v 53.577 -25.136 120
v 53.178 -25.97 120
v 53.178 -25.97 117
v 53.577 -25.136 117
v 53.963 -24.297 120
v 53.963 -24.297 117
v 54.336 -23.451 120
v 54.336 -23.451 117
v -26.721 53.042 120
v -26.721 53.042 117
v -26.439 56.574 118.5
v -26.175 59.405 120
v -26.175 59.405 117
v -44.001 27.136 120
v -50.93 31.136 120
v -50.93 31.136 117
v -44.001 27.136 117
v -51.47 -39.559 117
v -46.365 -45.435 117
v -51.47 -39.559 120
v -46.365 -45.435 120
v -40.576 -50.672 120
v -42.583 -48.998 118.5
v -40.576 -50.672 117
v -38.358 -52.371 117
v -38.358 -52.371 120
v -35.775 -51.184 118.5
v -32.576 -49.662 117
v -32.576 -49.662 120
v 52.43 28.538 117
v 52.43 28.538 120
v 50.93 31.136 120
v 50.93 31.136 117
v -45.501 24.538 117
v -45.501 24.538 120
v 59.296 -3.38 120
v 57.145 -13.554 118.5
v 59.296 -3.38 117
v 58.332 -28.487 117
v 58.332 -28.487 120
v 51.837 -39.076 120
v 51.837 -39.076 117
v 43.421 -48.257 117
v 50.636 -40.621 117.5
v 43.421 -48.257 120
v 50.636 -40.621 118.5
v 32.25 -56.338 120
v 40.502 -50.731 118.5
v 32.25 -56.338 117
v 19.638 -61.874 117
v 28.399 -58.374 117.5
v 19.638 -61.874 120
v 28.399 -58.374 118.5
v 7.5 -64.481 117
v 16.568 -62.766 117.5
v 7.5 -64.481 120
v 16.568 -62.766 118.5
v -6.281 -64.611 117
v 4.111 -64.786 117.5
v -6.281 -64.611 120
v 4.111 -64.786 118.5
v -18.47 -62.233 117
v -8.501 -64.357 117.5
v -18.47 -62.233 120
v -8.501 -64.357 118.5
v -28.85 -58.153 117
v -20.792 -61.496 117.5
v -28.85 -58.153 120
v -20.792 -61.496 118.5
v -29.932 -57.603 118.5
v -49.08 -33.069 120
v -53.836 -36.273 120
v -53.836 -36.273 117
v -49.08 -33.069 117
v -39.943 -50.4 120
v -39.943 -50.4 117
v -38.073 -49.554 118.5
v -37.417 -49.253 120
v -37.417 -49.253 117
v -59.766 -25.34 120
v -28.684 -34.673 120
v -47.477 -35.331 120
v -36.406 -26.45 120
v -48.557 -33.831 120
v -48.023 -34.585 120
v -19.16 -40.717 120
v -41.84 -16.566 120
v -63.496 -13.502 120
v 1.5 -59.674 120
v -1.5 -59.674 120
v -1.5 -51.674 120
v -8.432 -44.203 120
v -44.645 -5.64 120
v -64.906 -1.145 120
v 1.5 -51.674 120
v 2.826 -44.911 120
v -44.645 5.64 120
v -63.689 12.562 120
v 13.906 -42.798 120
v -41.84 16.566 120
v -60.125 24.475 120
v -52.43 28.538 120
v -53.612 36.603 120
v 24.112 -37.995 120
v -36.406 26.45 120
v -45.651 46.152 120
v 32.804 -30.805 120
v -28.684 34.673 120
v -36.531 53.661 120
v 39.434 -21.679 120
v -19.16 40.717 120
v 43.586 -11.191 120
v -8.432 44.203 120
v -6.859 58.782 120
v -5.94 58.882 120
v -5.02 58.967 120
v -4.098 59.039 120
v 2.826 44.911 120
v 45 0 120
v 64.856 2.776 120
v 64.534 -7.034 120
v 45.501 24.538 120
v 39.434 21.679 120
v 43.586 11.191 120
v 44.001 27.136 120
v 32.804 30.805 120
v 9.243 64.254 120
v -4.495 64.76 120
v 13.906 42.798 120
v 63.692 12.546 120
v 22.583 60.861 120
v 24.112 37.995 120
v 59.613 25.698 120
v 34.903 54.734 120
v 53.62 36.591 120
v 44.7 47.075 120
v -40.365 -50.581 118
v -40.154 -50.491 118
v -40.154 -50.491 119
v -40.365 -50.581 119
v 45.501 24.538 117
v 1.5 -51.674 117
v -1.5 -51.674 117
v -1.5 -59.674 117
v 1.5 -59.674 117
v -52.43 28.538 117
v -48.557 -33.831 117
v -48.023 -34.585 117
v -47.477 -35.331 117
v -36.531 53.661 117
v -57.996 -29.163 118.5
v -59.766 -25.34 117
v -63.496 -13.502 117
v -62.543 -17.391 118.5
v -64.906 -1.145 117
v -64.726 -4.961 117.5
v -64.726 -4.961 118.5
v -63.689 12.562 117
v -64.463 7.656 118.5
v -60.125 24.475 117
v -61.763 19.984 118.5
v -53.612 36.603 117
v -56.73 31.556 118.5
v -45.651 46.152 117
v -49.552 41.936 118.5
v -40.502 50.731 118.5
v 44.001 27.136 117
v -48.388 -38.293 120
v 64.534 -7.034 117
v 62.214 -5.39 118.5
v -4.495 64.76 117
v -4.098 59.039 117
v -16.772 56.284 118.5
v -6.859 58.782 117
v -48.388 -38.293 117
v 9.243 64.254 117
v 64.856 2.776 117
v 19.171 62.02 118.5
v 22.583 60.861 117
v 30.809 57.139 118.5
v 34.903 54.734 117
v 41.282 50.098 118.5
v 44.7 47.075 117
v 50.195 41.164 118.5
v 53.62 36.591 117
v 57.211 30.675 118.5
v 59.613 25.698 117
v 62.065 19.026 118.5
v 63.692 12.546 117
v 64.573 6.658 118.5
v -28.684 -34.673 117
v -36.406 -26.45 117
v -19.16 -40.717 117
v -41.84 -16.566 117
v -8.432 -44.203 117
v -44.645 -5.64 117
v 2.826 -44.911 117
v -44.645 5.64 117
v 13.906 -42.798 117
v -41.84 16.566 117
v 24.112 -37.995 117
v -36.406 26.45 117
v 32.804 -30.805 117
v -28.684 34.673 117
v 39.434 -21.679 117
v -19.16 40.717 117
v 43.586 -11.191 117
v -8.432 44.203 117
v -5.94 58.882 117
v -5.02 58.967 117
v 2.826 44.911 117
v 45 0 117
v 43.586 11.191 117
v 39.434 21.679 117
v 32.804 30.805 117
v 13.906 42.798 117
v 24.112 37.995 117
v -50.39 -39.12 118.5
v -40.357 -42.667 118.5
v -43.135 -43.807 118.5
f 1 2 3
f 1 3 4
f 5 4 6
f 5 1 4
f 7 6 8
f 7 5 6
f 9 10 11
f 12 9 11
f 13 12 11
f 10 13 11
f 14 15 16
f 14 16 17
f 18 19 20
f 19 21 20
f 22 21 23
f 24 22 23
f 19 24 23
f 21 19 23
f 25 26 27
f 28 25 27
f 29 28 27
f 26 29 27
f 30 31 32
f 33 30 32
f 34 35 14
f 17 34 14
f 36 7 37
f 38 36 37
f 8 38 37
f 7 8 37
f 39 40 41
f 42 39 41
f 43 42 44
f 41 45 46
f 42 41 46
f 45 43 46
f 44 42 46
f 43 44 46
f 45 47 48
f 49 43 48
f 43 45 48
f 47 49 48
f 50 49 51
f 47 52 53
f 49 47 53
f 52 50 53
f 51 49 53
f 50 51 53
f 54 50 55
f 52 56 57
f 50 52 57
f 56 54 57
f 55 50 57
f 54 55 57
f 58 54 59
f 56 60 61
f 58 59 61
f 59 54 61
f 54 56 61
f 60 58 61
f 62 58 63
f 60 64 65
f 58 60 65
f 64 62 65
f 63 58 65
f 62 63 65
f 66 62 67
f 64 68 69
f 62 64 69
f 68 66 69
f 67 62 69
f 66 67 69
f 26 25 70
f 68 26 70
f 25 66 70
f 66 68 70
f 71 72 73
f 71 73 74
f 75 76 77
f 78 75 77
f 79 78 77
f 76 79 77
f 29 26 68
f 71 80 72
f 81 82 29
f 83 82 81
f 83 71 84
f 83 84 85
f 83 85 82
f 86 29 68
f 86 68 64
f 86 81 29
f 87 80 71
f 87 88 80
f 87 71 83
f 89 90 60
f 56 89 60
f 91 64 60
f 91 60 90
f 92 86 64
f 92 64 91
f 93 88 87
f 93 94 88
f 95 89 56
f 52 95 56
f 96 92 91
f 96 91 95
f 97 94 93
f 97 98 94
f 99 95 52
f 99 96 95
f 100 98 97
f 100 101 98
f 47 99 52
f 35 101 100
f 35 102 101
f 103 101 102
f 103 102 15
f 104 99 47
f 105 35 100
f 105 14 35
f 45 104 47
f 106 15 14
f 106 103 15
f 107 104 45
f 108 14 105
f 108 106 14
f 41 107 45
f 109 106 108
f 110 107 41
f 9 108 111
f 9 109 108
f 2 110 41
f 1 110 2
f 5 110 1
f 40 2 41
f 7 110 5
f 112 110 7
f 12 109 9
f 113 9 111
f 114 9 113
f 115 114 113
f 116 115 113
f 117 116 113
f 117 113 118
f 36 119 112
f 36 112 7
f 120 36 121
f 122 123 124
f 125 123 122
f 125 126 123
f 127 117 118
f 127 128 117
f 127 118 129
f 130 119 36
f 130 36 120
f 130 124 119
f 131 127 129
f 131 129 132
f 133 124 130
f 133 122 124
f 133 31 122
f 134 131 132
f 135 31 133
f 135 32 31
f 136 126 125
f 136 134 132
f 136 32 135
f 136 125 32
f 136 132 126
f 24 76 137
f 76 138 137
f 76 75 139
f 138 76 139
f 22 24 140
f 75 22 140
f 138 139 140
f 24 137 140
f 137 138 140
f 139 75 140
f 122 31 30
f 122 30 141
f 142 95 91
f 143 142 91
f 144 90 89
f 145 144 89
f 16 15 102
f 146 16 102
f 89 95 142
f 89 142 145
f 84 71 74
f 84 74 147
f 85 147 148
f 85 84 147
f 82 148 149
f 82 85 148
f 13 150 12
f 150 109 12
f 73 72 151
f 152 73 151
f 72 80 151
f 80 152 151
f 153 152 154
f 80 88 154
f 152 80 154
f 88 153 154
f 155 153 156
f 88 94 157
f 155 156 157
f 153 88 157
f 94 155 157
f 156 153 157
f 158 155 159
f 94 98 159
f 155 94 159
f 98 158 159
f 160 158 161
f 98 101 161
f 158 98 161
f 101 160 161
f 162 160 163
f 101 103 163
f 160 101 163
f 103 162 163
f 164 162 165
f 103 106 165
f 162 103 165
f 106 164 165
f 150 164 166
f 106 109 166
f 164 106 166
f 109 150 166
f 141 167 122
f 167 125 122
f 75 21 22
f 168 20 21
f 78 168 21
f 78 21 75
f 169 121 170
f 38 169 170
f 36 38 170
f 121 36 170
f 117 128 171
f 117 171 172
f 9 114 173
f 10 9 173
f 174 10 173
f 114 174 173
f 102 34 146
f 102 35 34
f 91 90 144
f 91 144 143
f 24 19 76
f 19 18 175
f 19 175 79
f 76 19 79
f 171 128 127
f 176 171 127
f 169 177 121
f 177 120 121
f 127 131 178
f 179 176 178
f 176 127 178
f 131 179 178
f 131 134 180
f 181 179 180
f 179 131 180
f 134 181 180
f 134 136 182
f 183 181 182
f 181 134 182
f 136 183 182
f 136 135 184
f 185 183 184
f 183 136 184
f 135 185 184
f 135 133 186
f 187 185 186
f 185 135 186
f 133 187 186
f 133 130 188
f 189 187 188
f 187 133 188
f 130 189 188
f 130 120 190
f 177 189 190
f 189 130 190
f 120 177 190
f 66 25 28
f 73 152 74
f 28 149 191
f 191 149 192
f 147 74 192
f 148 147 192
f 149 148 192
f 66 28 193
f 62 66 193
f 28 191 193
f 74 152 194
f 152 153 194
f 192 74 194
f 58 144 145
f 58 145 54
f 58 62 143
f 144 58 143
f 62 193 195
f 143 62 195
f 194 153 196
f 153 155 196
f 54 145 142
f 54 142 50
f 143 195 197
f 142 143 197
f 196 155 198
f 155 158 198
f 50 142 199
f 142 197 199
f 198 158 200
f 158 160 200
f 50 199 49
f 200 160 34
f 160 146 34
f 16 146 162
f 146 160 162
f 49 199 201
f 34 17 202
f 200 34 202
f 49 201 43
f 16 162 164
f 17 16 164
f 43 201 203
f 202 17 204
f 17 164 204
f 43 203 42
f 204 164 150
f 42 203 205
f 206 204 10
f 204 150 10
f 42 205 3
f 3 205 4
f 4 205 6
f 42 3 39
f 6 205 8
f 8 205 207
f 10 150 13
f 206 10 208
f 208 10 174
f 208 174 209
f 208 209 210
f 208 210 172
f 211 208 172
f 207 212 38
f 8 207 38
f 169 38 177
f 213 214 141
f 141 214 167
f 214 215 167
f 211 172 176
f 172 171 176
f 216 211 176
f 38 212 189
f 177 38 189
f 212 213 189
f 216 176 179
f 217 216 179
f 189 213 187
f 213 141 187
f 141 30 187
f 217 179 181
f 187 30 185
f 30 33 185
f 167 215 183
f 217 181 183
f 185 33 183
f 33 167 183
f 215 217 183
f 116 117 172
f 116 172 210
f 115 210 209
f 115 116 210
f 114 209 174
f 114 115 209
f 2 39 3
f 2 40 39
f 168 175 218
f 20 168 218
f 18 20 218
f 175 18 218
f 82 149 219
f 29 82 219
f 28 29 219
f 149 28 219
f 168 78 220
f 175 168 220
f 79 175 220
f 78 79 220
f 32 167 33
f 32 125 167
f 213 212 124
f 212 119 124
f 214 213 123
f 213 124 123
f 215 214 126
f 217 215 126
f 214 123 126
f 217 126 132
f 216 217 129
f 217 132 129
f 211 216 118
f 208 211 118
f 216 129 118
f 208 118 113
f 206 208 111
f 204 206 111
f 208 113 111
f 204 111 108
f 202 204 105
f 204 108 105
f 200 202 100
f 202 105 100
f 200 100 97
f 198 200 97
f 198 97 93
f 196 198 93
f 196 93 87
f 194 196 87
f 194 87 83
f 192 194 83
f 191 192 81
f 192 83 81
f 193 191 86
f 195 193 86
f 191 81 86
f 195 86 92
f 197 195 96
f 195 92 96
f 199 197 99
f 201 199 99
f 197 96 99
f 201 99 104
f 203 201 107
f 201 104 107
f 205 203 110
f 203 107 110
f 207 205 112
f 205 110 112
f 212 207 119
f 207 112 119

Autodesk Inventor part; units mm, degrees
ref_plane "YZ Plane" through (0, 0, 0) normal (1, 0, 0) x (0, 1, 0)
ref_plane "XZ Plane" through (0, 0, 0) normal (0, 1, 0) x (-1, 0, 0)
ref_plane "XY Plane" through (0, 0, 0) normal (0, 0, 1) x (1, 0, 0)
ref_plane "Work Plane1" through (0, 193.1274, 120) normal (0, 0, 1) x (1, 0, 0)
sketch "Sketch1" plane through (0, 193.1274, 120) normal (0, 0, 1) x (1, 0, 0)
  spline S0 degree 3 poles (-8.5236, -128.7736) (-8.5781, -129.1585) (-8.6317, -129.5435) (-8.7822, -130.6438) (-8.877, -131.3595) (-8.9685, -132.0756) knots 0 0 0 0 0.34999 0.34999 1 1 1 1
  spline S1 degree 3 poles (-8.9685, -132.0756) (-11.4491, -132.616) (-13.9179, -133.213) (-18.9128, -134.5473) (-21.4399, -135.2896) (-23.9457, -136.0968) knots 0.135755 0.135755 0.135755 0.135755 0.897312 0.897312 1.686862 1.686862 1.686862 1.686862
  spline S2 degree 3 poles (-23.9457, -136.0968) (-23.9236, -135.8572) (-23.9012, -135.6176) (-23.8137, -134.697) (-23.7461, -134.0162) (-23.6756, -133.3357) knots 0 0 0 0 0.260219 0.260219 1 1 1 1
  spline S3 degree 3 poles (-23.6756, -133.3357) (-23.6491, -133.1076) (-23.6222, -132.8795) (-23.595, -132.6515) knots 0 0 0 0 1 1 1 1
  spline S4 degree 3 poles (-23.595, -132.6515) (-18.7496, -130.761) (-13.6896, -129.4578) (-8.5236, -128.7736) knots 20.983609 20.983609 20.983609 20.983609 22.549805 22.549805 22.549805 22.549805
  spline S5 degree 3 poles (59.9939, -217.9227) (59.6983, -217.6913) (59.4023, -217.4606) (58.5248, -216.78) (57.9417, -216.3318) (57.3567, -215.8863) knots 0 0 0 0 0.337929 0.337929 1 1 1 1
  spline S6 degree 3 poles (57.3567, -215.8863) (58.129, -213.4679) (58.8464, -211.0314) (60.1883, -206.0385) (60.809, -203.4788) (61.3628, -200.9052) knots 0.135755 0.135755 0.135755 0.135755 0.897312 0.897312 1.686862 1.686862 1.686862 1.686862
  spline S7 degree 3 poles (61.3628, -200.9052) (61.5593, -201.0441) (61.7556, -201.1833) (62.5091, -201.7193) (63.0649, -202.1183) (63.6189, -202.5196) knots 0 0 0 0 0.260219 0.260219 1 1 1 1
  spline S8 degree 3 poles (63.6189, -202.5196) (63.8032, -202.6566) (63.9873, -202.794) (64.1712, -202.9316) knots 0 0 0 0 1 1 1 1
  spline S9 degree 3 poles (64.1712, -202.9316) (63.7306, -205.8156) (63.0951, -208.6728) (61.6213, -213.6722) (60.8623, -215.8215) (59.9939, -217.9227) knots 34.623618 34.623618 34.623618 34.623618 35.502619 35.502619 36.187238 36.187238 36.187238 36.187238
  spline S10 degree 3 poles (-32.5756, -242.7893) (-35.2521, -240.5525) (-37.8465, -238.2164) (-42.8091, -233.429) (-45.1835, -230.9795) (-47.4773, -228.4585) knots 0.183672 0.183672 0.183672 0.183672 1.230026 1.230026 2.252069 2.252069 2.252069 2.252069
  spline S11 degree 3 poles (-47.4773, -228.4585) (-48.486, -228.8718) (-49.4978, -229.2781) (-51.3339, -230.0008) (-52.1579, -230.3199) (-52.9837, -230.6347) knots 0.191156 0.191156 0.191156 0.191156 0.518074 0.518074 0.783091 0.783091 0.783091 0.783091
  spline S12 degree 3 poles (-52.9837, -230.6347) (-54.8569, -227.9885) (-56.5335, -225.1998) (-61.7939, -214.7383) (-64.08, -206.5168) (-65.372, -189.6602) (-64.3656, -181.1864) (-59.1613, -165.1013) (-55.0131, -157.644) (-44.0918, -144.739) (-37.423, -139.4149) (-28.6906, -134.8793) (-27.4411, -134.2804) (-26.1751, -133.7226) knots 9.166621 9.166621 9.166621 9.166621 10.143606 10.143606 12.679507 12.679507 15.215408 15.215408 17.75131 17.75131 20.287211 20.287211 20.703322 20.703322 20.703322 20.703322
  spline S13 degree 3 poles (-26.1751, -133.7226) (-26.2685, -134.6656) (-26.3566, -135.6092) (-26.5417, -137.7293) (-26.6358, -138.907) (-26.7206, -140.0852) knots 0.27267 0.27267 0.27267 0.27267 0.556851 0.556851 0.91105 0.91105 0.91105 0.91105
  spline S14 degree 3 poles (-26.7206, -140.0852) (-23.4453, -138.8857) (-20.1249, -137.8069) (-13.4977, -135.9029) (-10.1891, -135.0714) (-6.8589, -134.3454) knots 0.183672 0.183672 0.183672 0.183672 1.230026 1.230026 2.252069 2.252069 2.252069 2.252069
  spline S15 degree 3 poles (-6.8589, -134.3454) (-6.7126, -133.2651) (-6.5585, -132.1857) (-6.2663, -130.2343) (-6.1307, -129.3611) (-5.9904, -128.4886) knots 0.191156 0.191156 0.191156 0.191156 0.518074 0.518074 0.783091 0.783091 0.783091 0.783091
  spline S16 degree 3 poles (-5.9904, -128.4886) (-5.9303, -128.483) (-5.8702, -128.4775) (2.609, -127.7156) (11.0954, -128.6107) (27.2473, -133.6035) (34.7585, -137.6534) (47.8056, -148.4045) (53.2169, -155.0028) (61.2055, -169.9023) (63.7065, -178.061) (65.044, -191.0327) (65.0284, -195.6223) (64.5336, -200.1615) knots 22.804998 22.804998 22.804998 22.804998 22.823113 22.823113 25.359014 25.359014 27.894915 27.894915 30.430817 30.430817 32.966718 32.966718 34.342971 34.342971 34.342971 34.342971
  spline S17 degree 3 poles (64.5336, -200.1615) (63.7637, -199.6091) (62.9906, -199.0611) (61.247, -197.8407) (60.2742, -197.1704) (59.2962, -196.5078) knots 0.27267 0.27267 0.27267 0.27267 0.556851 0.556851 0.91105 0.91105 0.91105 0.91105
  spline S18 degree 3 poles (59.2962, -196.5078) (58.7011, -199.9229) (57.9804, -203.3168) (56.3185, -210.0089) (55.3791, -213.311) (54.3362, -216.5785) knots 0.183672 0.183672 0.183672 0.183672 1.223566 1.223566 2.252068 2.252068 2.252068 2.252068
  spline S19 degree 3 poles (54.3362, -216.5785) (55.1888, -217.2378) (56.0367, -217.9032) (57.5809, -219.1316) (58.279, -219.6934) (58.9741, -220.259) knots 0.191156 0.191156 0.191156 0.191156 0.514352 0.514352 0.783093 0.783093 0.783093 0.783093
  spline S20 degree 3 poles (-48.3881, -231.4203) (-46.6799, -233.2984) (-44.9285, -235.1379) (-41.2755, -238.7965) (-39.3691, -240.6138) (-37.4172, -242.3803) knots 0.135755 0.135755 0.135755 0.135755 0.897312 0.897312 1.686862 1.686862 1.686862 1.686862
  spline S21 degree 3 poles (-37.4172, -242.3803) (-37.6357, -242.481) (-37.8544, -242.5814) (-38.6954, -242.9659) (-39.3188, -243.2477) (-39.9433, -243.527) knots 0 0 0 0 0.260219 0.260219 1 1 1 1
  spline S22 degree 3 poles (-7.5005, -129.5095) (-7.584, -130.1058) (-7.6655, -130.7024) (-7.8244, -131.8995) (-7.9018, -132.5) (-7.977, -133.1007) knots 0 0 0 0 0.498609 0.498609 1 1 1 1
  spline S23 degree 3 poles (-7.2694, -129.468) (-7.3079, -129.4749) (-7.3464, -129.4818) (-7.4234, -129.4956) (-7.4619, -129.5026) (-7.5005, -129.5095) knots 0 0 0 0 0.500065 0.500065 1 1 1 1
  spline S24 degree 3 poles (-7.8342, -133.3176) (-7.745, -132.6733) (-7.6532, -132.0292) (-7.4648, -130.7461) (-7.3683, -130.1068) (-7.2694, -129.468) knots 0 0 0 0 0.50156 0.50156 1 1 1 1
  spline S25 degree 3 poles (-25.4683, -138.246) (-22.5608, -137.2415) (-19.6212, -136.3286) (-13.7391, -134.691) (-10.7949, -133.9632) (-7.8342, -133.3176) knots -1.831866 -1.831866 -1.831866 -1.831866 -0.909091 -0.909091 0 0 0 0
  spline S26 degree 3 poles (-24.8602, -131.8333) (-24.9726, -132.8737) (-25.0786, -133.9151) (-25.2822, -136.0525) (-25.3792, -137.149) (-25.4683, -138.246) knots -0.64407 -0.64407 -0.64407 -0.64407 -0.330168 -0.330168 0 0 0 0
  spline S27 degree 3 poles (-40.8735, -245.1308) (-42.2164, -244.0754) (-43.5199, -242.9667) (-51.1195, -235.9758) (-56.2587, -228.9623) (-63.5596, -213.3602) (-65.6514, -204.9207) (-66.4822, -187.715) (-65.2134, -179.1132) (-59.4499, -162.8802) (-55.0103, -155.4042) (-43.5155, -142.5746) (-36.5701, -137.3438) (-27.5163, -132.9614) (-26.1964, -132.3752) (-24.8602, -131.8333) knots -34.104259 -34.104259 -34.104259 -34.104259 -33.590314 -33.590314 -31.006444 -31.006444 -28.422574 -28.422574 -25.838703 -25.838703 -23.254833 -23.254833 -20.670963 -20.670963 -20.237237 -20.237237 -20.237237 -20.237237
  spline S28 degree 3 poles (-39.0691, -244.3542) (-39.3864, -244.4922) (-39.704, -244.6296) (-40.3055, -244.8884) (-40.5894, -245.0099) (-40.8735, -245.1308) knots 0 0 0 0 0.528438 0.528438 1 1 1 1
  spline S29 degree 3 poles (-35.2346, -242.5871) (-35.8743, -242.8888) (-36.5154, -243.1876) (-37.7935, -243.7765) (-38.4307, -244.0667) (-39.0691, -244.3542) knots 0 0 0 0 0.502528 0.502528 1 1 1 1
  spline S30 degree 3 poles (-47.9961, -230.049) (-46.0008, -232.2434) (-43.9453, -234.3847) (-39.6934, -238.5693) (-37.494, -240.6129) (-35.2346, -242.5871) knots -1.789969 -1.789969 -1.789969 -1.789969 -0.90011 -0.90011 0 0 0 0
  spline S31 degree 3 poles (-51.3445, -231.432) (-50.7863, -231.2062) (-50.2289, -230.9784) (-49.1128, -230.5175) (-48.554, -230.2843) (-47.9961, -230.049) knots 0 0 0 0 0.498609 0.498609 1 1 1 1
  spline S32 degree 3 poles (-51.496, -231.2526) (-51.4708, -231.2825) (-51.4455, -231.3124) (-51.395, -231.3722) (-51.3698, -231.4021) (-51.3445, -231.432) knots 0 0 0 0 0.500065 0.500065 1 1 1 1
  spline S33 degree 3 poles (-47.8797, -229.817) (-48.4823, -230.0619) (-49.086, -230.3044) (-50.2914, -230.7828) (-50.8933, -231.0189) (-51.496, -231.2526) knots 0 0 0 0 0.50156 0.50156 1 1 1 1
  spline S34 degree 3 poles (-34.7946, -242.6244) (-37.1182, -240.6086) (-39.3786, -238.5193) (-43.7379, -234.2441) (-45.8403, -232.0583) (-47.8797, -229.817) knots -1.831866 -1.831866 -1.831866 -1.831866 -0.909091 -0.909091 0 0 0 0
  spline S35 degree 3 poles (-40.6522, -245.304) (-39.695, -244.8812) (-38.7401, -244.4523) (-36.7872, -243.5599) (-35.7891, -243.0956) (-34.7946, -242.6244) knots -0.64407 -0.64407 -0.64407 -0.64407 -0.330168 -0.330168 0 0 0 0
  spline S36 degree 3 poles (0, -259.2712) (-7.8255, -259.2712) (-15.5958, -257.8824) (-29.3299, -252.8022) (-35.3004, -249.4738) (-40.6522, -245.304) knots -38.525501 -38.525501 -38.525501 -38.525501 -36.174184 -36.174184 -34.13245 -34.13245 -34.13245 -34.13245
  spline S37 degree 3 poles (65.473, -202.5232) (64.9341, -206.2791) (64.0716, -209.9903) (60.2232, -221.8041) (55.9814, -229.3941) (44.8272, -242.5208) (38.0214, -247.9321) (30.3701, -251.8868) (26.0379, -254.1258) (21.4715, -255.879) (12.0364, -258.3494) (7.1967, -259.0591) (1.5485, -259.2576) (0.774, -259.2712) (0, -259.2712) knots -6.311327 -6.311327 -6.311327 -6.311327 -5.167741 -5.167741 -2.58387 -2.58387 0 0 0 1.462965 1.462965 2.925931 2.925931 3.158484 3.158484 3.158484 3.158484
  spline S38 degree 3 poles (63.8982, -201.3489) (64.1764, -201.5546) (64.4542, -201.761) (64.9791, -202.1525) (65.2262, -202.3377) (65.473, -202.5232) knots 0 0 0 0 0.528438 0.528438 1 1 1 1
  spline S39 degree 3 poles (60.4507, -198.9117) (61.0317, -199.3148) (61.6111, -199.7206) (62.7601, -200.5331) (63.3301, -200.9398) (63.8982, -201.3489) knots 0 0 0 0 0.502528 0.502528 1 1 1 1
  spline S40 degree 3 poles (55.9731, -216.2325) (56.8758, -213.4073) (57.7025, -210.5565) (59.2006, -204.782) (59.8706, -201.8554) (60.4507, -198.9117) knots -1.789969 -1.789969 -1.789969 -1.789969 -0.90011 -0.90011 0 0 0 0
  spline S41 degree 3 poles (58.8449, -218.4408) (58.3703, -218.0703) (57.8944, -217.7014) (56.9372, -216.9653) (56.4558, -216.598) (55.9731, -216.2325) knots 0 0 0 0 0.498609 0.498609 1 1 1 1
  spline S42 degree 3 poles (58.7654, -218.6617) (58.7787, -218.6248) (58.7919, -218.5881) (58.8184, -218.5145) (58.8317, -218.4776) (58.8449, -218.4408) knots 0 0 0 0 0.500065 0.500065 1 1 1 1
  spline S43 degree 3 poles (55.7139, -216.2477) (56.2274, -216.6471) (56.7392, -217.0487) (57.7563, -217.8534) (58.2616, -218.2566) (58.7654, -218.6617) knots 0 0 0 0 0.50156 0.50156 1 1 1 1
  spline S44 degree 3 poles (60.2629, -198.512) (59.679, -201.5321) (58.9999, -204.5344) (57.477, -210.4472) (56.6352, -213.3609) (55.7139, -216.2477) knots -1.831866 -1.831866 -1.831866 -1.831866 -0.909091 -0.909091 0 0 0 0
  spline S45 degree 3 poles (65.5124, -202.245) (64.6675, -201.6274) (63.8187, -201.0149) (62.0694, -199.7698) (61.1683, -199.1376) (60.2629, -198.512) knots -0.64407 -0.64407 -0.64407 -0.64407 -0.330168 -0.330168 0 0 0 0
  spline S46 degree 3 poles (-24.5995, -131.7282) (-18.0519, -129.1049) (-11.117, -127.542) (4.5396, -126.5799) (13.1572, -127.7358) (29.4645, -133.2858) (36.9981, -137.6268) (49.9774, -148.9523) (55.2989, -155.8285) (63.0067, -171.2336) (65.3193, -179.6153) (66.3106, -192.8981) (66.1582, -197.6047) (65.5124, -202.245) knots -20.209057 -20.209057 -20.209057 -20.209057 -18.087092 -18.087092 -15.503222 -15.503222 -12.919352 -12.919352 -10.335481 -10.335481 -7.751611 -7.751611 -6.339562 -6.339562 -6.339562 -6.339562
  spline S47 degree 3 poles (-24.8291, -133.6792) (-24.79, -133.3354) (-24.7502, -132.9917) (-24.6736, -132.3413) (-24.6368, -132.0347) (-24.5995, -131.7282) knots 0 0 0 0 0.528438 0.528438 1 1 1 1
  spline S48 degree 3 poles (-25.216, -137.8835) (-25.1575, -137.1787) (-25.0957, -136.4741) (-24.9666, -135.0727) (-24.8993, -134.3758) (-24.8291, -133.6792) knots 0 0 0 0 0.502528 0.502528 1 1 1 1
  spline S49 degree 3 poles (-7.977, -133.1007) (-10.875, -133.7316) (-13.7572, -134.4411) (-19.5071, -136.031) (-22.3766, -136.914) (-25.216, -137.8835) knots -1.789969 -1.789969 -1.789969 -1.789969 -0.90011 -0.90011 0 0 0 0
  circle A0 centre (0, -193.1274) radius 45
  line L0 (44.0013, -165.9912) -> (50.9295, -161.9912)
  line L1 (52.4295, -164.5893) -> (50.9295, -161.9912)
  line L2 (52.4295, -164.5893) -> (45.5013, -168.5893)
  line L3 (44.0013, -165.9912) -> (45.5013, -168.5893)
  line L4 (-50.9295, -161.9912) -> (-44.0013, -165.9912)
  line L5 (-50.9295, -161.9912) -> (-52.4295, -164.5893)
  line L6 (-45.5013, -168.5893) -> (-52.4295, -164.5893)
  line L7 (-45.5013, -168.5893) -> (-44.0013, -165.9912)
  line L8 (-1.5, -252.8018) -> (-1.5, -244.8018)
  line L9 (1.5, -244.8018) -> (-1.5, -244.8018)
  line L10 (1.5, -244.8018) -> (1.5, -252.8018)
  line L11 (-1.5, -252.8018) -> (1.5, -252.8018)
  spline S50 degree 3 poles (-38.3585, -245.4981) (-37.4952, -245.1076) (-36.634, -244.712) (-34.7053, -243.8123) (-33.6384, -243.3049) (-32.5756, -242.7893) knots 0.27267 0.27267 0.27267 0.27267 0.556851 0.556851 0.91105 0.91105 0.91105 0.91105
  spline S51 degree 3 poles (58.9741, -220.259) (56.7613, -225.0687) (53.9634, -229.6006) (47.641, -237.4817) (44.2425, -240.8723) (36.7621, -246.8445) (32.7031, -249.4078) (28.3993, -251.5016) (20.7982, -255.1996) (12.5473, -257.3776) (4.1113, -257.9129) (-4.3247, -258.4483) (-12.7847, -257.3308) (-27.0897, -252.4941) (-33.0126, -249.4137) (-38.3585, -245.4981) knots 36.443216 36.443216 36.443216 36.443216 38.038521 38.038521 39.474327 39.474327 40.910133 40.910133 40.910133 43.446034 43.446034 43.446034 45.981935 45.981935 47.976198 47.976198 47.976198 47.976198
  spline S52 degree 3 poles (-40.5762, -243.7993) (-41.2556, -243.2553) (-41.9245, -242.6972) (-45.8604, -239.2766) (-48.8363, -236.1131) (-51.4702, -232.686) knots 7.346153 7.346153 7.346153 7.346153 7.607704 7.607704 8.910509 8.910509 8.910509 8.910509
  spline S53 degree 3 poles (-51.4702, -232.686) (-51.1097, -232.5407) (-50.7495, -232.3946) (-49.7213, -231.9749) (-49.0541, -231.6991) (-48.3881, -231.4203) knots 0 0 0 0 0.34999 0.34999 1 1 1 1
  spline S54 degree 3 poles (-39.9433, -243.527) (-40.1542, -243.618) (-40.3651, -243.7088) (-40.5762, -243.7993) knots 0 0 0 0 1 1 1 1
  point P0 (4.1113, -257.9129)
  dimension "d0" = 90
extrude "Extrusion1" add sketch "Sketch1" against normal blind 3 contours S10 S11 S12 S13 S14 S15 S16 S17 S18 S19 S51 S50 | S20 S21 S54 S52 S53
sketch "Sketch2" plane through (0, 193.1274, 120) normal (0, 0, 1) x (1, 0, 0)
  point P0 (0, -193.1274)
sketch "Sketch3" plane through (0, 193.1274, 120) normal (0, 0, 1) x (1, 0, 0)
  ellipse E0 centre (-53.6671, -215.1652) end of major axis (-140.5176, -322.1703) minor radius 96.9651 (54.3362, -216.5785) -> (59.2962, -196.5078) ccw projected
  ellipse E1 centre (-0.0025, -193.1242) end of major axis (40.4209, -243.9233) minor radius 64.9177 (4.1113, -257.9129) -> (58.9741, -220.259) ccw projected
  circle A0 centre (-0.0025, -193.1242) radius 59.1844
  line L0 (58.3315, -221.6144) -> (53.1782, -219.0975)
  spline S0 degree 3 poles (54.3362, -216.5785) (55.1888, -217.2378) (56.0367, -217.9032) (57.5809, -219.1316) (58.279, -219.6934) (58.9741, -220.259) knots 0.191156 0.191156 0.191156 0.191156 0.514352 0.514352 0.783093 0.783093 0.783093 0.783093 projected
  point P0 (0, -193.1274)
  dimension "d3" = 1.5
extrude "Extrusion2" cut sketch "Sketch3" against normal blind 3 contours S0 E1 L0 A0
pattern_circular "Circular Pattern1" count 3 over 360 about axis through (0, 0, 120) along (0, 0, -1) of "Extrusion2"
properties part number "top_centering_ring"
